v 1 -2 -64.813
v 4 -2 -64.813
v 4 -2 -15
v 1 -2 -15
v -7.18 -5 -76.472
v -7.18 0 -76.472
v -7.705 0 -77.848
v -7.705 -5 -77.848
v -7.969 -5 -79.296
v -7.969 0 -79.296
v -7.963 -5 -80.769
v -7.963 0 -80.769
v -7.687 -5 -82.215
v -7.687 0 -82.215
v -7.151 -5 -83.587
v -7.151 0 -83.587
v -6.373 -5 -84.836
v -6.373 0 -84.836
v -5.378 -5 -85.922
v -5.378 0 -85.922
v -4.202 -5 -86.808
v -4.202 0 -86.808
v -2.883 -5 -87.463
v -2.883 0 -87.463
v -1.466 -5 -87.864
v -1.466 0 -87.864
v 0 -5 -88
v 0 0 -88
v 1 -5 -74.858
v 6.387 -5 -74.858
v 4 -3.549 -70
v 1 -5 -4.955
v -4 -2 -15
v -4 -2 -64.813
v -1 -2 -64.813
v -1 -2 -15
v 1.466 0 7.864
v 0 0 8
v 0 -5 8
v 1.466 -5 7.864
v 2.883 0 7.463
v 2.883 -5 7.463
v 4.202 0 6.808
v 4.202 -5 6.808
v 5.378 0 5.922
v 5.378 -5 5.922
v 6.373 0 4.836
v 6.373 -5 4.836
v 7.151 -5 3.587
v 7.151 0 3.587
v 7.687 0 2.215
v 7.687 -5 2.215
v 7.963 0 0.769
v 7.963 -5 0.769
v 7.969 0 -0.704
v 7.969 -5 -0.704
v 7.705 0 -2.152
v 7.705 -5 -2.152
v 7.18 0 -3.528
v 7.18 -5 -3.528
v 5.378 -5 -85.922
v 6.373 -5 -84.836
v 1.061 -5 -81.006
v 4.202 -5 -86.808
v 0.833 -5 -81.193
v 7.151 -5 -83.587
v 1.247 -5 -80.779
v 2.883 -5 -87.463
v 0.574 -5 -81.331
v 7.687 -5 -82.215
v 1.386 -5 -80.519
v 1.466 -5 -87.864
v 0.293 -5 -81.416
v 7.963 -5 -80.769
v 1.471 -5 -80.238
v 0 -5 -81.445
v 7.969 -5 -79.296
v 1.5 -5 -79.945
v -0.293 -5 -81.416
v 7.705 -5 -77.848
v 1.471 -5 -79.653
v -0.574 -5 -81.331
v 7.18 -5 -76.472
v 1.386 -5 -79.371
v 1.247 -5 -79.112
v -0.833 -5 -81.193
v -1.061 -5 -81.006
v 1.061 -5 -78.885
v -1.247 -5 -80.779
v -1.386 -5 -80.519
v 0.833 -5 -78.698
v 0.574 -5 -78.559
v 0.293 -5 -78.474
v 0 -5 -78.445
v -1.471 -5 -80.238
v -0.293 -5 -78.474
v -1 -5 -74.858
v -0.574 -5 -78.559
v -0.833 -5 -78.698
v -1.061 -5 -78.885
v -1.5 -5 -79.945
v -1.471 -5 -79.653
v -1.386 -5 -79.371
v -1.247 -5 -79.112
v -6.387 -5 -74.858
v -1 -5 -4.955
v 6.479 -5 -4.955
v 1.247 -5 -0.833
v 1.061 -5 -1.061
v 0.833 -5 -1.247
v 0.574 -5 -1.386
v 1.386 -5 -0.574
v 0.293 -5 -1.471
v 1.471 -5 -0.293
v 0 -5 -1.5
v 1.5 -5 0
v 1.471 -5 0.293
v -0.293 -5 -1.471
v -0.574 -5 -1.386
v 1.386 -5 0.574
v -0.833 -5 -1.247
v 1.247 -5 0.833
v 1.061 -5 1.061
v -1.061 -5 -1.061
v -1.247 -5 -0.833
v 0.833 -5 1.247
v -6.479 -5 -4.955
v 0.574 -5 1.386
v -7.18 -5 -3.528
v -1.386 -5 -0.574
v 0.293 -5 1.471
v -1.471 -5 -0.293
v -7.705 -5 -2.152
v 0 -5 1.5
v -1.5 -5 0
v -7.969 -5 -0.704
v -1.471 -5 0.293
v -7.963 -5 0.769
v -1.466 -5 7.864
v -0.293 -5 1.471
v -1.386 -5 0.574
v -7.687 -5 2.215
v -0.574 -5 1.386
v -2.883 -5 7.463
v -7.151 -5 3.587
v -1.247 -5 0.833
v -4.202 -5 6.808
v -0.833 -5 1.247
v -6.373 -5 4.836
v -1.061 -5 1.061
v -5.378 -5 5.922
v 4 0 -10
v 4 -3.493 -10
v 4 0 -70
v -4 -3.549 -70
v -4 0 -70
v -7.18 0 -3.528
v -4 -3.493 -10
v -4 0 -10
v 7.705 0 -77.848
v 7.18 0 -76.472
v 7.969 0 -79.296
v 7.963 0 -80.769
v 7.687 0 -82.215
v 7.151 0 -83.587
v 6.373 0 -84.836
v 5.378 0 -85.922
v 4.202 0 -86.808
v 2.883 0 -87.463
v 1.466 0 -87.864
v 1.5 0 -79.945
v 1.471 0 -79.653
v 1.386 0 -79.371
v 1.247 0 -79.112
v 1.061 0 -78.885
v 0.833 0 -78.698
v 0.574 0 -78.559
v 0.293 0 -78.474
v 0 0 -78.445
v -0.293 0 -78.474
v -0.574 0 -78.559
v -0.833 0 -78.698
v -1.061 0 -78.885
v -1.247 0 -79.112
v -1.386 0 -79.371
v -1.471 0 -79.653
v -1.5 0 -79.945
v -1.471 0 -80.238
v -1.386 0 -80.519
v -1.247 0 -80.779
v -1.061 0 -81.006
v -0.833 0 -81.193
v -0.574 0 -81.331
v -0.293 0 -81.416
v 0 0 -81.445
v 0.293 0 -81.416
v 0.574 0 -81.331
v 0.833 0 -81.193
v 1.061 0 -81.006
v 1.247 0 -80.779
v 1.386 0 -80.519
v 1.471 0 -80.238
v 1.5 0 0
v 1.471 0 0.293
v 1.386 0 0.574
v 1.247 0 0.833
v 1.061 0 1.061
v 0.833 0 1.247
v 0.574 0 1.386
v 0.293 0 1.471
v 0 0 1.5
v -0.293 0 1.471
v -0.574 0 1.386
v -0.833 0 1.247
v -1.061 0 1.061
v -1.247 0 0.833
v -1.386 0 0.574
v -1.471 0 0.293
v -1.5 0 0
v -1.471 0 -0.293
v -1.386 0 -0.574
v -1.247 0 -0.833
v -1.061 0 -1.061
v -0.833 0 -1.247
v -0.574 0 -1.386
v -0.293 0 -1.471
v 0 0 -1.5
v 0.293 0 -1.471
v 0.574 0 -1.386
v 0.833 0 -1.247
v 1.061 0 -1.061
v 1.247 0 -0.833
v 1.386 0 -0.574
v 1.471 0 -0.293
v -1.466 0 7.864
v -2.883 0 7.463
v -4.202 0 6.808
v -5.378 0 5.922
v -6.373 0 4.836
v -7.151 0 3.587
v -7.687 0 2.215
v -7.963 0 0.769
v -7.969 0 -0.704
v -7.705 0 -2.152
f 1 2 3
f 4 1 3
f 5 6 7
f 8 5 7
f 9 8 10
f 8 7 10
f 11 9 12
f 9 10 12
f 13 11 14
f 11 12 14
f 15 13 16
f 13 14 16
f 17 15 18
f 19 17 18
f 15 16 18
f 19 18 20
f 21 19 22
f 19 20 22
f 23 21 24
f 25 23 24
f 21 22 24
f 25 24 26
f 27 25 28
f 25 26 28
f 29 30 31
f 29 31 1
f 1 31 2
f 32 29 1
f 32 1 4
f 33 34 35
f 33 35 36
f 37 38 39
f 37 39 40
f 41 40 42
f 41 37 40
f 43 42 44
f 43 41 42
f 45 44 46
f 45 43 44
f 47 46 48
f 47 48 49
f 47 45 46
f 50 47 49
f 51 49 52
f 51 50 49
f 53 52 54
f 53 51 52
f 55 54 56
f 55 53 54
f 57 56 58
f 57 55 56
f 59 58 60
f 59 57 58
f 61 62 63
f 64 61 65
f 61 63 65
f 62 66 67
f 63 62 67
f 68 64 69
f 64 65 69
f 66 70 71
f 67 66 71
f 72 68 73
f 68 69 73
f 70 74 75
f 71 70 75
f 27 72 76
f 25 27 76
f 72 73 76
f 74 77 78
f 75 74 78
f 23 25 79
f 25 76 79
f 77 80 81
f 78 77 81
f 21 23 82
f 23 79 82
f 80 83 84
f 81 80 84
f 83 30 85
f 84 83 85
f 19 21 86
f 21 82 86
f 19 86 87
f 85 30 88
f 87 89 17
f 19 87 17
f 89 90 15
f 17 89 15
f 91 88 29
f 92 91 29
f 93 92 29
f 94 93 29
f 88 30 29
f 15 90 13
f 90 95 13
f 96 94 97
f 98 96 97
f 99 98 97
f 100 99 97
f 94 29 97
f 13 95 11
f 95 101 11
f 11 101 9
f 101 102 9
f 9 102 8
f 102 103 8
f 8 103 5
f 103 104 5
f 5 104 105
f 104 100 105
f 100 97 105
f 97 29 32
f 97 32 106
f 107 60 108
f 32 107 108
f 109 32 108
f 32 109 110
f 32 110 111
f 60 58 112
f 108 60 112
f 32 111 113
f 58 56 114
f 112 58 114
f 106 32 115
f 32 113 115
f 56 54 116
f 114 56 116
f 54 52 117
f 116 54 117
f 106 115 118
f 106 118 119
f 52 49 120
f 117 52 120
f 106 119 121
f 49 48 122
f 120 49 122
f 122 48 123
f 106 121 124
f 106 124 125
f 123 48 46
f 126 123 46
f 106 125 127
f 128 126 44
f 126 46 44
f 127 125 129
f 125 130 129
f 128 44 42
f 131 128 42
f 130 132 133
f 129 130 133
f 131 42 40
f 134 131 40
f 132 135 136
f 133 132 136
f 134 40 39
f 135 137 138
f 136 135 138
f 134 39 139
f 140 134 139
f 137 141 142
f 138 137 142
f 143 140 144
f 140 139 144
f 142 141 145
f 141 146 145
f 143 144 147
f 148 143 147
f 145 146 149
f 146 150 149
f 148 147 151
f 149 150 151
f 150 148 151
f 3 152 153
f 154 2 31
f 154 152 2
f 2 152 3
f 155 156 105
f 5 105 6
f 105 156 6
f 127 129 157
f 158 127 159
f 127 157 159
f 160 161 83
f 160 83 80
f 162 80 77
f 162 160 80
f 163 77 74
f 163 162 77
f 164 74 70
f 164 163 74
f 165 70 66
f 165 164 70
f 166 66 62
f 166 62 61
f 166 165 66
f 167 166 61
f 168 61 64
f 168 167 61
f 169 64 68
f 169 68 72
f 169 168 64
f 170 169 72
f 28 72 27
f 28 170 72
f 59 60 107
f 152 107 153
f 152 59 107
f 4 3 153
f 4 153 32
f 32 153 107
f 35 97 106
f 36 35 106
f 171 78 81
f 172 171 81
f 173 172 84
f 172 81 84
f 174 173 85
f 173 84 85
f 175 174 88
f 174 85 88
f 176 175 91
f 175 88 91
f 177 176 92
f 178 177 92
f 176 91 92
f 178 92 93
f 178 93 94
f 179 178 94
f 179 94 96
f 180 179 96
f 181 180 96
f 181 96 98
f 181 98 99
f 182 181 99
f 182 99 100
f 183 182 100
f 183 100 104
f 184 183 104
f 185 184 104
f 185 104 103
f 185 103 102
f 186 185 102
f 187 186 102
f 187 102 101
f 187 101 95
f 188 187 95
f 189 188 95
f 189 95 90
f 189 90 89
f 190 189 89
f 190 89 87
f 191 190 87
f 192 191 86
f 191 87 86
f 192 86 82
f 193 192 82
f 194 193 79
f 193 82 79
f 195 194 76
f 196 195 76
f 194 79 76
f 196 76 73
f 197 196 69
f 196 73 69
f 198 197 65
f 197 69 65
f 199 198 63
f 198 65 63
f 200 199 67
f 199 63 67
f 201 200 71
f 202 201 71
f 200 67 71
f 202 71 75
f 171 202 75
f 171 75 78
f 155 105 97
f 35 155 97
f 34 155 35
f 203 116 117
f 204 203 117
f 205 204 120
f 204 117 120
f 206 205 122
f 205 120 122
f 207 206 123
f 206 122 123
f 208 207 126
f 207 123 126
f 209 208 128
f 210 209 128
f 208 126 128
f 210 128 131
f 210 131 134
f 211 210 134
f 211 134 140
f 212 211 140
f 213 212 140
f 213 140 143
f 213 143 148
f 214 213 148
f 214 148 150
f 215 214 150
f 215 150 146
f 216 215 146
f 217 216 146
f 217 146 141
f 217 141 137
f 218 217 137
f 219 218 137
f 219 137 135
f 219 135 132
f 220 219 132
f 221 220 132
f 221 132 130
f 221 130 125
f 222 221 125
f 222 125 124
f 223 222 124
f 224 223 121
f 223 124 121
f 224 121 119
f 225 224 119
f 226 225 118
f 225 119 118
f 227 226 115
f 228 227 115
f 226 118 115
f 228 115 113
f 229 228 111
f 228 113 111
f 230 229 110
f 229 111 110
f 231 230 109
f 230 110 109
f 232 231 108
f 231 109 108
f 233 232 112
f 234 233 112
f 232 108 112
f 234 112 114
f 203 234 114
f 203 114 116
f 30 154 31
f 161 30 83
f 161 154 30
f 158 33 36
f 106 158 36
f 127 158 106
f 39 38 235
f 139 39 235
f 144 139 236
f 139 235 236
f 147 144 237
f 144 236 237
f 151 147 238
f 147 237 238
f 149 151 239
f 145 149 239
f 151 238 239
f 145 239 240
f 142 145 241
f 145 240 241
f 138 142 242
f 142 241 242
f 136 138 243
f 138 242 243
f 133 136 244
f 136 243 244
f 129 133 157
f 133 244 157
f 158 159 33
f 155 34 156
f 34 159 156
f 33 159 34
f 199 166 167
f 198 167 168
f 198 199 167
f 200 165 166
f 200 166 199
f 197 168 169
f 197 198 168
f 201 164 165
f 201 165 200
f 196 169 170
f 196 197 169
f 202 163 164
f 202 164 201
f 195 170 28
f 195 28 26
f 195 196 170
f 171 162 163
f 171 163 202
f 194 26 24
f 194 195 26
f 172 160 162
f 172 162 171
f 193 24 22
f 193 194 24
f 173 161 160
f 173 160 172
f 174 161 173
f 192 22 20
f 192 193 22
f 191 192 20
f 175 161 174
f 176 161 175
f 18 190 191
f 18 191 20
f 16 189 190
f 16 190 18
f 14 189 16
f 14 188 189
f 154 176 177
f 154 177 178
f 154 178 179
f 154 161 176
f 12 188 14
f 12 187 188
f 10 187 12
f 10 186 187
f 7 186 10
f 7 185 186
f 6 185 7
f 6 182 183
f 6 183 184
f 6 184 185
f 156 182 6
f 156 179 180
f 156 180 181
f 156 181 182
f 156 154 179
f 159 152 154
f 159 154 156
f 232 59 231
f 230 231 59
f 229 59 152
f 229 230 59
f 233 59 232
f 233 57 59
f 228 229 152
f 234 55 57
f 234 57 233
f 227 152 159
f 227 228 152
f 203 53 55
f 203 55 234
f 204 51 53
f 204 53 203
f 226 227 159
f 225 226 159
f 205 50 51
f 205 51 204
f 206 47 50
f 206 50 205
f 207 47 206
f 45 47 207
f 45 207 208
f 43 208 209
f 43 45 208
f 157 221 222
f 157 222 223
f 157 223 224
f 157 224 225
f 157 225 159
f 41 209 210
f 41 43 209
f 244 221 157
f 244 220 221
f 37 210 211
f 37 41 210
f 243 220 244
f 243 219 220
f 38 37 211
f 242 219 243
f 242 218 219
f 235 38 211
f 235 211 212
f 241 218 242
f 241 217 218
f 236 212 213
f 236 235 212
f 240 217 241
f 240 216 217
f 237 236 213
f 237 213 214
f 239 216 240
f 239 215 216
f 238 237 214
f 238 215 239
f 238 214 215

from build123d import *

# Parameters (mm, degrees)
F0_W      = 4
F0_H      = 5.1029750705
F1_DEPTH  = 5
F4_DEPTH  = 9
F6_W      = 44.082082808
F6_H      = 137.8899626434
F7_DEPTH  = 25
F9_R      = 1.5
F10_DEPTH = 25


with BuildPart() as f1:
    # F0 (on Front) → F1 (new body)
    with BuildSketch(Plane.XZ):
        with Locations((2, -12.5514875352)):
            Rectangle(F0_W, F0_H)
        with BuildLine():
            Line((-4, -10), (0, -10))
            Line((0, -10), (0, -8))
            ThreePointArc((0, -8), (-2.0705523608, -7.7274066103), (-4, -6.9282032303))
            Line((-4, -6.9282032303), (-4, -10))
        make_face()
        with Locations((-2, -12.5514875352)):
            Rectangle(F0_W, F0_H)
        with BuildLine():
            Line((0, -8), (0, -10))
            Line((0, -10), (4, -10))
            Line((4, -10), (4, -6.9282032303))
            ThreePointArc((4, -6.9282032303), (2.0705523608, -7.7274066103), (0, -8))
        make_face()
        with BuildLine():
            Line((4, -15.1029750705), (0, -15.1029750705))
            Line((0, -15.1029750705), (0, -65))
            Line((0, -65), (0, -70))
            Line((0, -70), (0, -72))
            ThreePointArc((0, -72), (2.0705523608, -72.2725933897), (4, -73.0717967697))
            Line((4, -73.0717967697), (4, -70))
            Line((4, -70), (4, -15.1029750705))
        make_face()
        with BuildLine():
            Line((0, -65), (0, -15.1029750705))
            Line((0, -15.1029750705), (-4, -15.1029750705))
            Line((-4, -15.1029750705), (-4, -70))
            Line((-4, -70), (-4, -73.0717967697))
            ThreePointArc((-4, -73.0717967697), (-2.0705523608, -72.2725933897), (0, -72))
            Line((0, -72), (0, -70))
            Line((0, -70), (0, -65))
        make_face()
        with BuildLine():
            ThreePointArc((-4, -6.9282032303), (-2.0705523608, -7.7274066103), (0, -8))
            ThreePointArc((0, -8), (2.0705523608, -7.7274066103), (4, -6.9282032303))
            ThreePointArc((4, -6.9282032303), (5.8428493863, -5.4645320979), (7.1800707248, -3.5279717101))
            ThreePointArc((7.1800707248, -3.5279717101), (7.792322048, -1.8109989235), (8, 0))
            ThreePointArc((8, 0), (-1.8109989235, 7.792322048), (-7.1800707248, -3.5279717101))
            ThreePointArc((-7.1800707248, -3.5279717101), (-5.8428493863, -5.4645320979), (-4, -6.9282032303))
        make_face()
        with BuildLine():
            Line((-7.1800707248, -3.5279717101), (-4, -10))
            Line((-4, -10), (-4, -6.9282032303))
            ThreePointArc((-4, -6.9282032303), (-5.8428493863, -5.4645320979), (-7.1800707248, -3.5279717101))
        make_face()
        with BuildLine():
            Line((4, -6.9282032303), (4, -10))
            Line((4, -10), (7.1800707248, -3.5279717101))
            ThreePointArc((7.1800707248, -3.5279717101), (5.8428493863, -5.4645320979), (4, -6.9282032303))
        make_face()
        with BuildLine():
            Line((-4, -73.0717967697), (-4, -70))
            Line((-4, -70), (-7.1800707248, -76.4720282899))
            ThreePointArc((-7.1800707248, -76.4720282899), (-5.8428493863, -74.5354679021), (-4, -73.0717967697))
        make_face()
        with BuildLine():
            Line((7.1800707248, -76.4720282899), (4, -70))
            Line((4, -70), (4, -73.0717967697))
            ThreePointArc((4, -73.0717967697), (5.8428493863, -74.5354679021), (7.1800707248, -76.4720282899))
        make_face()
        with BuildLine():
            ThreePointArc((4, -73.0717967697), (2.0705523608, -72.2725933897), (0, -72))
            ThreePointArc((0, -72), (-2.0705523608, -72.2725933897), (-4, -73.0717967697))
            ThreePointArc((-4, -73.0717967697), (-5.8428493863, -74.5354679021), (-7.1800707248, -76.4720282899))
            ThreePointArc((-7.1800707248, -76.4720282899), (-1.8109989235, -87.792322048), (8, -80))
            ThreePointArc((8, -80), (7.792322048, -78.1890010765), (7.1800707248, -76.4720282899))
            ThreePointArc((7.1800707248, -76.4720282899), (5.8428493863, -74.5354679021), (4, -73.0717967697))
        make_face()
    extrude(amount=F1_DEPTH)

    # F3 (on offset) → F4 (cut)
    with BuildSketch(Plane.YZ.offset(-10)):
        Polygon((-2, -64.81321129), (-2, -15), (-5.3923702799, -3.64174202), (-5.3923702799, -76.1714303355), align=None)
    extrude(amount=F4_DEPTH, mode=Mode.SUBTRACT)

    # F6 (on Front) → F7 (cut, symmetric)
    with BuildSketch(Plane.XZ):
        with Locations((22.041041404, -24.6477220207)):
            Rectangle(F6_W, F6_H)
    extrude(amount=F7_DEPTH, both=True, mode=Mode.SUBTRACT)

    # F8: F1 across plane


with BuildPart() as f1_1:
    add(f1.part)
    add(f1.part.mirror(Plane.YZ))

    # F9 (on face) → F10 (cut)
    with BuildSketch(Plane.XZ.offset(5)):
        Circle(F9_R)
        with Locations((0, -79.9452960491)):
            Circle(F9_R)
    extrude(amount=-F10_DEPTH, mode=Mode.SUBTRACT)


solid = f1_1.part
